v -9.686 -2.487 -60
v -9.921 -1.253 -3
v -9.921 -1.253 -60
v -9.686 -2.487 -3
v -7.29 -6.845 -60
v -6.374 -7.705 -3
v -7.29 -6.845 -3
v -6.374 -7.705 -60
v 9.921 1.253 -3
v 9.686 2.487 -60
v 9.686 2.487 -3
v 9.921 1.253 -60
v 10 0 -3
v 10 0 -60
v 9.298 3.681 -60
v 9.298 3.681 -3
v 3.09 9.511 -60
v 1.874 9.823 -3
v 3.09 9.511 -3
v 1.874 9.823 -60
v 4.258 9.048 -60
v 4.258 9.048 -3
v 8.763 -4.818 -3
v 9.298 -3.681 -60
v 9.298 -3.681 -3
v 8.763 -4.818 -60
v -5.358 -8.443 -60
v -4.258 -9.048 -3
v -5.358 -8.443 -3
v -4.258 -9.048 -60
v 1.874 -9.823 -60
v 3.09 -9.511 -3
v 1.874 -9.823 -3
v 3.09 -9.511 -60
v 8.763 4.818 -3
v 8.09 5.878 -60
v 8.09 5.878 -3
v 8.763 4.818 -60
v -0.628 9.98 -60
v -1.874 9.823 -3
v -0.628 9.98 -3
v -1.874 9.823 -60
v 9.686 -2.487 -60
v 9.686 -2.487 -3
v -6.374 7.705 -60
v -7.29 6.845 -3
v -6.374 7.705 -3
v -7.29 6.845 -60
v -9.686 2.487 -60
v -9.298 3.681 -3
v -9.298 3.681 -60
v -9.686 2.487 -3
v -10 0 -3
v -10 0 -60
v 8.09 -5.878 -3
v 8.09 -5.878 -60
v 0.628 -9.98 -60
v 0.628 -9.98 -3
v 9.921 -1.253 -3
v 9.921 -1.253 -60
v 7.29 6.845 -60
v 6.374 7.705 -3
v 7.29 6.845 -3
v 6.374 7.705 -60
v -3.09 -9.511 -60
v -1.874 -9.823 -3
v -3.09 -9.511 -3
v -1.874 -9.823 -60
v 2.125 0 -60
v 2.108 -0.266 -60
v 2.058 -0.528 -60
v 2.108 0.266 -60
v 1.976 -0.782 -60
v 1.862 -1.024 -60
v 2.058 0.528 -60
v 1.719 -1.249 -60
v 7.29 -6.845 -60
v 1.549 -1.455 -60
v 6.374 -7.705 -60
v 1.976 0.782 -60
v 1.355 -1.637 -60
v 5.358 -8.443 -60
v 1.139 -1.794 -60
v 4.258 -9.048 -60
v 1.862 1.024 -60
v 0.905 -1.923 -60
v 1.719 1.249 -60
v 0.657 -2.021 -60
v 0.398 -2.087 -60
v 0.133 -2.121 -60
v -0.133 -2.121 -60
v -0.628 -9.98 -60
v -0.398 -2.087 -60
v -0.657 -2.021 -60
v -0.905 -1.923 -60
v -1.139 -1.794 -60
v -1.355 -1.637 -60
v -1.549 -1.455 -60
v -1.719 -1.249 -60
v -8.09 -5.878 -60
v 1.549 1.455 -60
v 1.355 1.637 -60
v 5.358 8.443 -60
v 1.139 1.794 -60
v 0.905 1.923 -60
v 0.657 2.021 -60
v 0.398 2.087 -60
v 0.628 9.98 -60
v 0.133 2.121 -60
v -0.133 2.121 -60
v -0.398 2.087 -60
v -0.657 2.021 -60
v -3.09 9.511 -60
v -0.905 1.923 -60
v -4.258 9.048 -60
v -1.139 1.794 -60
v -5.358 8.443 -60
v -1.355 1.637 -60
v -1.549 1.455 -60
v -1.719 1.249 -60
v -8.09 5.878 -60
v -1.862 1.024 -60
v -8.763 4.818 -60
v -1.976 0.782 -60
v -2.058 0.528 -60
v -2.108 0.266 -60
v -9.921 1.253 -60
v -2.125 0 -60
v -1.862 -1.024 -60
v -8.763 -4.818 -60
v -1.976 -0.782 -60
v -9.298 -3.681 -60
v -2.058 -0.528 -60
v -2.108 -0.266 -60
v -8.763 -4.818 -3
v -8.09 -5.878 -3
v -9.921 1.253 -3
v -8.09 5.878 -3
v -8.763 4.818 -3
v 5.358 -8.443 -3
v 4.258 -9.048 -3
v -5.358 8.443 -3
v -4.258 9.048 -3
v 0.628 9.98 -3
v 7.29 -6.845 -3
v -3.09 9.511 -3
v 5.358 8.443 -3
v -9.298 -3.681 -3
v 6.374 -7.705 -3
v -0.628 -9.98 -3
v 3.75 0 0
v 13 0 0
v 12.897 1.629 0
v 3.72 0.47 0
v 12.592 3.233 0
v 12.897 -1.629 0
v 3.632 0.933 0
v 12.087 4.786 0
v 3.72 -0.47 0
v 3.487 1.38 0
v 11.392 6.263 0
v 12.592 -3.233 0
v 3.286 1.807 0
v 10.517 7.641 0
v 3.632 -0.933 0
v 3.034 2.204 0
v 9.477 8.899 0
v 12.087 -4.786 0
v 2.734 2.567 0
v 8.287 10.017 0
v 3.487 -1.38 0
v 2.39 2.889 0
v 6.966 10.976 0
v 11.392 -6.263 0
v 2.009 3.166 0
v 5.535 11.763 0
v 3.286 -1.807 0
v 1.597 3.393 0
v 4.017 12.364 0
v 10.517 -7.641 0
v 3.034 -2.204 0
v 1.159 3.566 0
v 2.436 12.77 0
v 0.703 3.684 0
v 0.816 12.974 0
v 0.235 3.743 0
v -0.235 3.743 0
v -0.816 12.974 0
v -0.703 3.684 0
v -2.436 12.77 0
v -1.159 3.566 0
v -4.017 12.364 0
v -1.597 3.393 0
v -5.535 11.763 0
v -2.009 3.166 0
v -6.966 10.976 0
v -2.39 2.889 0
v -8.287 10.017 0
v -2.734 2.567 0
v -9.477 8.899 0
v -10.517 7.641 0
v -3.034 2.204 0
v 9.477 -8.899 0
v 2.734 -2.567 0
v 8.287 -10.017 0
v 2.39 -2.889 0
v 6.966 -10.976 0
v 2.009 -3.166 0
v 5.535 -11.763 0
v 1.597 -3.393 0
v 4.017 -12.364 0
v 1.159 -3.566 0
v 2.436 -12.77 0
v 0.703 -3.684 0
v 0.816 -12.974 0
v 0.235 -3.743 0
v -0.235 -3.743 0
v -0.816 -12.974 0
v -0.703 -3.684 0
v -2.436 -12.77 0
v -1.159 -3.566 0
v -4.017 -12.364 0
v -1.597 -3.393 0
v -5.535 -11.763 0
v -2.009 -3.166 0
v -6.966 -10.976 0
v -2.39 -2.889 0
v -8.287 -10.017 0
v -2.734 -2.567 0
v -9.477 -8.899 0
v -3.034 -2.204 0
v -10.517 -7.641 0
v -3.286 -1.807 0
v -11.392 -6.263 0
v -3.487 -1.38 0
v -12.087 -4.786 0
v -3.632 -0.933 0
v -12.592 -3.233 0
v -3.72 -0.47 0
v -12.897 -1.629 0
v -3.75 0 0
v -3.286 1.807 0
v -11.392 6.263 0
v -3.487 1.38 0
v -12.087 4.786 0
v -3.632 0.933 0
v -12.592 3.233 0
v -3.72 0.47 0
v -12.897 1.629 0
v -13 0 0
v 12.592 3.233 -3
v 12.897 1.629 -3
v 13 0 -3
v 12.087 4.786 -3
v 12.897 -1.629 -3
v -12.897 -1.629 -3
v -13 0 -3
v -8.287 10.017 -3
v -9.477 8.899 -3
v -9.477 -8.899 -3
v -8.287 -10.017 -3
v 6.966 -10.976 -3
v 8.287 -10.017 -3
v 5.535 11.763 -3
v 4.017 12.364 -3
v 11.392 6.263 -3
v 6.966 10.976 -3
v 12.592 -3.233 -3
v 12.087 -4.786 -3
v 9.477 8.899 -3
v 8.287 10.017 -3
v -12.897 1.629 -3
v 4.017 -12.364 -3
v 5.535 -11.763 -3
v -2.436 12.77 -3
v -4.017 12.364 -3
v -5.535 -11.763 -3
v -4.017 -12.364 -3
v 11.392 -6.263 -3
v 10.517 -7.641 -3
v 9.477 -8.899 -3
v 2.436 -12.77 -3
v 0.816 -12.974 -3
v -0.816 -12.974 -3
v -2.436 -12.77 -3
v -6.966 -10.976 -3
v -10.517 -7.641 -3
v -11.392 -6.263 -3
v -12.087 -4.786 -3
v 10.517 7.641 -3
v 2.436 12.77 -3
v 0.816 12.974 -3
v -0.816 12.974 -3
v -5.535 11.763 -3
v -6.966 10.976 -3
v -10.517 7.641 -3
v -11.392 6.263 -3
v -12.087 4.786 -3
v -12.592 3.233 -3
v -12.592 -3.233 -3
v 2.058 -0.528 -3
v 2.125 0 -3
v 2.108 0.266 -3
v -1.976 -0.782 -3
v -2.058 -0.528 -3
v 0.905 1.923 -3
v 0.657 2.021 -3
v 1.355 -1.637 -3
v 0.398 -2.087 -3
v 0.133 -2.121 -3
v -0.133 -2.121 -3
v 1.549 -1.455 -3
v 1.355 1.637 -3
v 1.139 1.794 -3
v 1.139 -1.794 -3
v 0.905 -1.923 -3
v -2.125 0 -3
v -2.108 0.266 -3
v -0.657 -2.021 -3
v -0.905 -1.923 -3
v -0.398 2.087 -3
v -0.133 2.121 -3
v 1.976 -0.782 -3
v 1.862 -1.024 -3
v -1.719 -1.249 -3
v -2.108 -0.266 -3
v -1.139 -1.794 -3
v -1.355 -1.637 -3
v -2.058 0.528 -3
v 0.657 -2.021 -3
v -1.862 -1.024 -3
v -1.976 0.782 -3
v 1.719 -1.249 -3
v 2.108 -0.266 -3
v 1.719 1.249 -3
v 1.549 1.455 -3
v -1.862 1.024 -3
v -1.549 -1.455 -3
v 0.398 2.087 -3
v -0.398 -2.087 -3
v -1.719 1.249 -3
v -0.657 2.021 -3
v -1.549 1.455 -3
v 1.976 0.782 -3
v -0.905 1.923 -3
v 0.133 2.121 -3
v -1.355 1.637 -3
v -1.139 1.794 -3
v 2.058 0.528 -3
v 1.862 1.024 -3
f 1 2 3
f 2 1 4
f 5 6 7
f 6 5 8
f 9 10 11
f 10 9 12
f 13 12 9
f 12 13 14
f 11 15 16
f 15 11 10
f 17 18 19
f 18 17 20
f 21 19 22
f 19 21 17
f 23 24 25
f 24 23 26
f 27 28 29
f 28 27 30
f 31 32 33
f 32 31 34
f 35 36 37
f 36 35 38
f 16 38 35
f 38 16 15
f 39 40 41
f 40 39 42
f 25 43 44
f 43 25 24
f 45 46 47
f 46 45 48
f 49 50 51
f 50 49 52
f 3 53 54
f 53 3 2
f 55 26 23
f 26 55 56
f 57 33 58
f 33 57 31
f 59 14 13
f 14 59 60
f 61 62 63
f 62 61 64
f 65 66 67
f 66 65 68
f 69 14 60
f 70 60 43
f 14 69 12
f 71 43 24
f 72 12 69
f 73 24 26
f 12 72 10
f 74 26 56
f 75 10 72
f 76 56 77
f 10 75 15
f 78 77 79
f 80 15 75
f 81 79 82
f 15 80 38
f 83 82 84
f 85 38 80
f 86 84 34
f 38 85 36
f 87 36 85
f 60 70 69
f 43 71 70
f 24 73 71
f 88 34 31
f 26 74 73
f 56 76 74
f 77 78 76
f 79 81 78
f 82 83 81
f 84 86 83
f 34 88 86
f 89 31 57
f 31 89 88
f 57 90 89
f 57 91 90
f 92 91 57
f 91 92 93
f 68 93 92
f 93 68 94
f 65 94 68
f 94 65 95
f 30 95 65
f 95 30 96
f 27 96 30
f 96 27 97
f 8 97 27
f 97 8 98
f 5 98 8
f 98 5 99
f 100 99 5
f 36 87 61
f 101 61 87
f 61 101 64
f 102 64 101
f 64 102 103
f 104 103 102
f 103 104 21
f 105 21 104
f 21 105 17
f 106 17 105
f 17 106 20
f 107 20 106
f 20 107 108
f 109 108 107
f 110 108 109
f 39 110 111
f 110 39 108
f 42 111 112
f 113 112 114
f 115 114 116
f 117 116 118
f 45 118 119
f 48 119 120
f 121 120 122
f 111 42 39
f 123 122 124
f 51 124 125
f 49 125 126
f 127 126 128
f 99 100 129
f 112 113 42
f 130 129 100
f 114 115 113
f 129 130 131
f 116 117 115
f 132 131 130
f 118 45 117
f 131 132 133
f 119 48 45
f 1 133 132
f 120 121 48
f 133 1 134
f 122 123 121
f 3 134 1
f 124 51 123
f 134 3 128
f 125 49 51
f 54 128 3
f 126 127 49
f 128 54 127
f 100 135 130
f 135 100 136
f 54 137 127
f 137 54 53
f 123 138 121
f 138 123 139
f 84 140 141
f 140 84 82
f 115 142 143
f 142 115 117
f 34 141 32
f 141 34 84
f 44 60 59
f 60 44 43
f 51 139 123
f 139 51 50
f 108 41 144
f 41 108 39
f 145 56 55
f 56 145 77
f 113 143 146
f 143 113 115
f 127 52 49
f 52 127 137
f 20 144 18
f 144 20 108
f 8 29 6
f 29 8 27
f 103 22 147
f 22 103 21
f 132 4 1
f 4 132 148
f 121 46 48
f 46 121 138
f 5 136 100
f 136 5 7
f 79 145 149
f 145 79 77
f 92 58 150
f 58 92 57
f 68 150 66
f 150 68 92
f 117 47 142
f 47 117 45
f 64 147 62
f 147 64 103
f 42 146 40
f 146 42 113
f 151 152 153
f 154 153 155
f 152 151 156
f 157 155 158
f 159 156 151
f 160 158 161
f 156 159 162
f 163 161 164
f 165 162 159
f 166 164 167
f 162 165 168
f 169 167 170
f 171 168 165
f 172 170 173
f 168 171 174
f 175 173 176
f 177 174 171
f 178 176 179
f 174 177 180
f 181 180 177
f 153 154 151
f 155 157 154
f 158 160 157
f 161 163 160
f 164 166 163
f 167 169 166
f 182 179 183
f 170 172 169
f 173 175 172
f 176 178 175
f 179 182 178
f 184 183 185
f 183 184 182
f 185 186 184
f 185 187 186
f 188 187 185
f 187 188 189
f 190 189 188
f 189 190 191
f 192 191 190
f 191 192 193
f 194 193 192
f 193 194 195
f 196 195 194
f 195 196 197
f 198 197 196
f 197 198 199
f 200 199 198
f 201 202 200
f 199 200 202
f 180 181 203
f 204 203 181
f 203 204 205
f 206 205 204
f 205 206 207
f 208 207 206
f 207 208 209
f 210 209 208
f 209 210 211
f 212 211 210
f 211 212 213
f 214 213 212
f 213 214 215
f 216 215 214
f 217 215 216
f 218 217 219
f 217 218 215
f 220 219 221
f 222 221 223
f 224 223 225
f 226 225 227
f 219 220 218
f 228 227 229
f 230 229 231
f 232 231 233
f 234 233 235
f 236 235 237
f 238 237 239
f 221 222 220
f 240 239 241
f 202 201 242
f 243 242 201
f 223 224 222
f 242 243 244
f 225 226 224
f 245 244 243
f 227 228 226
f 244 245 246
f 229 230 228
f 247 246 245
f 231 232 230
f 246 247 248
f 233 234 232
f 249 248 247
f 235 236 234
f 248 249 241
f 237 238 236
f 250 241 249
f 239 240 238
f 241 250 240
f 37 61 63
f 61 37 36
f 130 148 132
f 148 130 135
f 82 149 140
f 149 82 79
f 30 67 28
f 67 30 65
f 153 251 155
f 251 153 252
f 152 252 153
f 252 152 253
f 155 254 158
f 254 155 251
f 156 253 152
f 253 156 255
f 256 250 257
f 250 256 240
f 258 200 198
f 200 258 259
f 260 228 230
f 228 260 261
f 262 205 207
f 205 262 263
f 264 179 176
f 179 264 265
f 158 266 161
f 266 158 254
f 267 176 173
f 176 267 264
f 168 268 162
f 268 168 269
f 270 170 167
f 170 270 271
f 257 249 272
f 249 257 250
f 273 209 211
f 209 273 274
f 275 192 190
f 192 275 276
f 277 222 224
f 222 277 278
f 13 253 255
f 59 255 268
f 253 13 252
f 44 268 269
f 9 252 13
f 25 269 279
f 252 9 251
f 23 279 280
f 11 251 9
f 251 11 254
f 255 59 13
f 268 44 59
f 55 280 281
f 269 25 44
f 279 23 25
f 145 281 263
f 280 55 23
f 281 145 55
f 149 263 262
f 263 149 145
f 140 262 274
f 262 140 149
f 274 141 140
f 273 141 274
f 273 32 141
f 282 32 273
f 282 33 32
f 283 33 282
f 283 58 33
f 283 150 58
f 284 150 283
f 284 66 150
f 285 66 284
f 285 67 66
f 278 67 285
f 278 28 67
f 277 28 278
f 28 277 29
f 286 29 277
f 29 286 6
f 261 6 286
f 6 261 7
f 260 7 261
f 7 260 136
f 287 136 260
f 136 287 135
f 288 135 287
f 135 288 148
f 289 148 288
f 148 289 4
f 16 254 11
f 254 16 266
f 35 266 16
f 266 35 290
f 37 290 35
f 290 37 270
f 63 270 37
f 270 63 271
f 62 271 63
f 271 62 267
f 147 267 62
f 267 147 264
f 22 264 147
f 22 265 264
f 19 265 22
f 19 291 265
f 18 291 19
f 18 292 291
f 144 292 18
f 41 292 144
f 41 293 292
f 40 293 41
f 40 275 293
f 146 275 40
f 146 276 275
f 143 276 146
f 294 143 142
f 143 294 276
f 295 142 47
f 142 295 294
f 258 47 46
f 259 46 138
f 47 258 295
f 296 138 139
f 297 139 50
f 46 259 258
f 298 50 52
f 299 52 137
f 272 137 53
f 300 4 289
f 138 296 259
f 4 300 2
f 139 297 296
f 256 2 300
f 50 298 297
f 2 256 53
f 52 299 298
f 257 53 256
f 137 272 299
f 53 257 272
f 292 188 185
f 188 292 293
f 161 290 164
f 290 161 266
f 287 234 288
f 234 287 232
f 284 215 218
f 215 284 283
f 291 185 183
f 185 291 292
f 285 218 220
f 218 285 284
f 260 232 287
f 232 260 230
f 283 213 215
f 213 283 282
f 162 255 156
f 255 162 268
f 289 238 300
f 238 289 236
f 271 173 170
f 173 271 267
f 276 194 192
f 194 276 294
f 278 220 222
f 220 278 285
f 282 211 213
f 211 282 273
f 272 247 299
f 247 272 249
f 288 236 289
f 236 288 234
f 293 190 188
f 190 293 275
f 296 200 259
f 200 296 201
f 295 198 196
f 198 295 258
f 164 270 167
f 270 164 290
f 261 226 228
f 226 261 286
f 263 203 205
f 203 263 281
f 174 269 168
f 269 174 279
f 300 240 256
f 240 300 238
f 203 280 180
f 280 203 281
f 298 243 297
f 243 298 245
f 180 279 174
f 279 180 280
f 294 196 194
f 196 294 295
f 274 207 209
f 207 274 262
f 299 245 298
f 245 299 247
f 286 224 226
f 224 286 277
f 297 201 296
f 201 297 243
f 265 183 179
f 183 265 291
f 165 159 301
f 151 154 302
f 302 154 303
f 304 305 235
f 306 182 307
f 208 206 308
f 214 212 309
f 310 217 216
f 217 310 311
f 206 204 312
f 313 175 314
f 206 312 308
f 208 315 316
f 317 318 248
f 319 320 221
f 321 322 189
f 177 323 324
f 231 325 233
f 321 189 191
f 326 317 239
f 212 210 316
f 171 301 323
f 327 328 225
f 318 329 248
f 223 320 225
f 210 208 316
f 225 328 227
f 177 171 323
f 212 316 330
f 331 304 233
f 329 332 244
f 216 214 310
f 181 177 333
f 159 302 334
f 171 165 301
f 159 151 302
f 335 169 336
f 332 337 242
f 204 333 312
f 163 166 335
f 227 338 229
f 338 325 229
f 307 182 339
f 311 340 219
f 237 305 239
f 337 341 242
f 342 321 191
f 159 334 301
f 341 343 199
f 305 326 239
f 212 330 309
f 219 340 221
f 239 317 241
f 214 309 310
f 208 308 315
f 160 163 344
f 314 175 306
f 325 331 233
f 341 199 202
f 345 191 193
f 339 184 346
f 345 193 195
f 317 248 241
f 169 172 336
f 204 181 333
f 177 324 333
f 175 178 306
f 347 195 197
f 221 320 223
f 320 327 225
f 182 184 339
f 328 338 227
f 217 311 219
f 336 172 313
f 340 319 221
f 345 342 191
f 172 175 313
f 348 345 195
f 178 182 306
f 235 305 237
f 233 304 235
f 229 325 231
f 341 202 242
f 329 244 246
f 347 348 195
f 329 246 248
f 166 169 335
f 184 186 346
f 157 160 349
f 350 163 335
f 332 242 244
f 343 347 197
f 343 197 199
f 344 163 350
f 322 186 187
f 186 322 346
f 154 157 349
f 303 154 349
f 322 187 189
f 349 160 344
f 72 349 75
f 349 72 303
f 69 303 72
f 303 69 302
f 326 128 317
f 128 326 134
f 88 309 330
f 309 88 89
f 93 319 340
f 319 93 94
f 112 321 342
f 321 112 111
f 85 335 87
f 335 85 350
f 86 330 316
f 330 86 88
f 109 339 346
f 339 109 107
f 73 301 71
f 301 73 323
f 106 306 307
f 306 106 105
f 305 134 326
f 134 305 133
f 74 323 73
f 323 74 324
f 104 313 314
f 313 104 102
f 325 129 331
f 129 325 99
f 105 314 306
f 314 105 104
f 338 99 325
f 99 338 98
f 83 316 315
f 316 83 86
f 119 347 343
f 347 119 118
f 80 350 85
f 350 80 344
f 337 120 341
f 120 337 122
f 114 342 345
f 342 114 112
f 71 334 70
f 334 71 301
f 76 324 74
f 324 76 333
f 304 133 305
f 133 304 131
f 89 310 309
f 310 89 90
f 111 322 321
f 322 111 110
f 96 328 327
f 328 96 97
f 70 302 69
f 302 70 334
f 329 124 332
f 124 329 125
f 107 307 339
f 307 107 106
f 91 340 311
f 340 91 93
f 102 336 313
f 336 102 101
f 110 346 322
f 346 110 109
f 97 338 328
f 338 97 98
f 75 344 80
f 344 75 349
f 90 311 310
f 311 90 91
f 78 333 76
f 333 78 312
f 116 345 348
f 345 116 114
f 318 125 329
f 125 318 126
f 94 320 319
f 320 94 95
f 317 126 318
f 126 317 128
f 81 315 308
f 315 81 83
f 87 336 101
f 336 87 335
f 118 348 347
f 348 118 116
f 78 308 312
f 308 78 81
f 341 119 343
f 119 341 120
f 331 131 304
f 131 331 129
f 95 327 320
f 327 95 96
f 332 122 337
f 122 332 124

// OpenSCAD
$fn = 50;


difference() {
	union() {
		translate(v = [0, 0, -60.0000000000]) {
			cylinder(h = 60, r = 10.0000000000);
		}
		translate(v = [0, 0, -3.0000000000]) {
			cylinder(h = 3, r = 13.0000000000);
		}
	}
	union() {
		translate(v = [0, 0, 0]) {
			rotate(a = [0, 0, 0]) {
				difference() {
					union() {
						#translate(v = [0, 0, -60.0000000000]) {
							cylinder(h = 60, r = 2.0000000000);
						}
						#translate(v = [0, 0, -3]) {
							cylinder(h = 3, r1 = 2.1250000000, r2 = 3.7500000000);
						}
						#translate(v = [0, 0, -60.0000000000]) {
							cylinder(h = 60, r = 2.1250000000);
						}
						#translate(v = [0, 0, -60.0000000000]) {
							cylinder(h = 60, r = 2.0000000000);
						}
					}
					union();
				}
			}
		}
	}
}
